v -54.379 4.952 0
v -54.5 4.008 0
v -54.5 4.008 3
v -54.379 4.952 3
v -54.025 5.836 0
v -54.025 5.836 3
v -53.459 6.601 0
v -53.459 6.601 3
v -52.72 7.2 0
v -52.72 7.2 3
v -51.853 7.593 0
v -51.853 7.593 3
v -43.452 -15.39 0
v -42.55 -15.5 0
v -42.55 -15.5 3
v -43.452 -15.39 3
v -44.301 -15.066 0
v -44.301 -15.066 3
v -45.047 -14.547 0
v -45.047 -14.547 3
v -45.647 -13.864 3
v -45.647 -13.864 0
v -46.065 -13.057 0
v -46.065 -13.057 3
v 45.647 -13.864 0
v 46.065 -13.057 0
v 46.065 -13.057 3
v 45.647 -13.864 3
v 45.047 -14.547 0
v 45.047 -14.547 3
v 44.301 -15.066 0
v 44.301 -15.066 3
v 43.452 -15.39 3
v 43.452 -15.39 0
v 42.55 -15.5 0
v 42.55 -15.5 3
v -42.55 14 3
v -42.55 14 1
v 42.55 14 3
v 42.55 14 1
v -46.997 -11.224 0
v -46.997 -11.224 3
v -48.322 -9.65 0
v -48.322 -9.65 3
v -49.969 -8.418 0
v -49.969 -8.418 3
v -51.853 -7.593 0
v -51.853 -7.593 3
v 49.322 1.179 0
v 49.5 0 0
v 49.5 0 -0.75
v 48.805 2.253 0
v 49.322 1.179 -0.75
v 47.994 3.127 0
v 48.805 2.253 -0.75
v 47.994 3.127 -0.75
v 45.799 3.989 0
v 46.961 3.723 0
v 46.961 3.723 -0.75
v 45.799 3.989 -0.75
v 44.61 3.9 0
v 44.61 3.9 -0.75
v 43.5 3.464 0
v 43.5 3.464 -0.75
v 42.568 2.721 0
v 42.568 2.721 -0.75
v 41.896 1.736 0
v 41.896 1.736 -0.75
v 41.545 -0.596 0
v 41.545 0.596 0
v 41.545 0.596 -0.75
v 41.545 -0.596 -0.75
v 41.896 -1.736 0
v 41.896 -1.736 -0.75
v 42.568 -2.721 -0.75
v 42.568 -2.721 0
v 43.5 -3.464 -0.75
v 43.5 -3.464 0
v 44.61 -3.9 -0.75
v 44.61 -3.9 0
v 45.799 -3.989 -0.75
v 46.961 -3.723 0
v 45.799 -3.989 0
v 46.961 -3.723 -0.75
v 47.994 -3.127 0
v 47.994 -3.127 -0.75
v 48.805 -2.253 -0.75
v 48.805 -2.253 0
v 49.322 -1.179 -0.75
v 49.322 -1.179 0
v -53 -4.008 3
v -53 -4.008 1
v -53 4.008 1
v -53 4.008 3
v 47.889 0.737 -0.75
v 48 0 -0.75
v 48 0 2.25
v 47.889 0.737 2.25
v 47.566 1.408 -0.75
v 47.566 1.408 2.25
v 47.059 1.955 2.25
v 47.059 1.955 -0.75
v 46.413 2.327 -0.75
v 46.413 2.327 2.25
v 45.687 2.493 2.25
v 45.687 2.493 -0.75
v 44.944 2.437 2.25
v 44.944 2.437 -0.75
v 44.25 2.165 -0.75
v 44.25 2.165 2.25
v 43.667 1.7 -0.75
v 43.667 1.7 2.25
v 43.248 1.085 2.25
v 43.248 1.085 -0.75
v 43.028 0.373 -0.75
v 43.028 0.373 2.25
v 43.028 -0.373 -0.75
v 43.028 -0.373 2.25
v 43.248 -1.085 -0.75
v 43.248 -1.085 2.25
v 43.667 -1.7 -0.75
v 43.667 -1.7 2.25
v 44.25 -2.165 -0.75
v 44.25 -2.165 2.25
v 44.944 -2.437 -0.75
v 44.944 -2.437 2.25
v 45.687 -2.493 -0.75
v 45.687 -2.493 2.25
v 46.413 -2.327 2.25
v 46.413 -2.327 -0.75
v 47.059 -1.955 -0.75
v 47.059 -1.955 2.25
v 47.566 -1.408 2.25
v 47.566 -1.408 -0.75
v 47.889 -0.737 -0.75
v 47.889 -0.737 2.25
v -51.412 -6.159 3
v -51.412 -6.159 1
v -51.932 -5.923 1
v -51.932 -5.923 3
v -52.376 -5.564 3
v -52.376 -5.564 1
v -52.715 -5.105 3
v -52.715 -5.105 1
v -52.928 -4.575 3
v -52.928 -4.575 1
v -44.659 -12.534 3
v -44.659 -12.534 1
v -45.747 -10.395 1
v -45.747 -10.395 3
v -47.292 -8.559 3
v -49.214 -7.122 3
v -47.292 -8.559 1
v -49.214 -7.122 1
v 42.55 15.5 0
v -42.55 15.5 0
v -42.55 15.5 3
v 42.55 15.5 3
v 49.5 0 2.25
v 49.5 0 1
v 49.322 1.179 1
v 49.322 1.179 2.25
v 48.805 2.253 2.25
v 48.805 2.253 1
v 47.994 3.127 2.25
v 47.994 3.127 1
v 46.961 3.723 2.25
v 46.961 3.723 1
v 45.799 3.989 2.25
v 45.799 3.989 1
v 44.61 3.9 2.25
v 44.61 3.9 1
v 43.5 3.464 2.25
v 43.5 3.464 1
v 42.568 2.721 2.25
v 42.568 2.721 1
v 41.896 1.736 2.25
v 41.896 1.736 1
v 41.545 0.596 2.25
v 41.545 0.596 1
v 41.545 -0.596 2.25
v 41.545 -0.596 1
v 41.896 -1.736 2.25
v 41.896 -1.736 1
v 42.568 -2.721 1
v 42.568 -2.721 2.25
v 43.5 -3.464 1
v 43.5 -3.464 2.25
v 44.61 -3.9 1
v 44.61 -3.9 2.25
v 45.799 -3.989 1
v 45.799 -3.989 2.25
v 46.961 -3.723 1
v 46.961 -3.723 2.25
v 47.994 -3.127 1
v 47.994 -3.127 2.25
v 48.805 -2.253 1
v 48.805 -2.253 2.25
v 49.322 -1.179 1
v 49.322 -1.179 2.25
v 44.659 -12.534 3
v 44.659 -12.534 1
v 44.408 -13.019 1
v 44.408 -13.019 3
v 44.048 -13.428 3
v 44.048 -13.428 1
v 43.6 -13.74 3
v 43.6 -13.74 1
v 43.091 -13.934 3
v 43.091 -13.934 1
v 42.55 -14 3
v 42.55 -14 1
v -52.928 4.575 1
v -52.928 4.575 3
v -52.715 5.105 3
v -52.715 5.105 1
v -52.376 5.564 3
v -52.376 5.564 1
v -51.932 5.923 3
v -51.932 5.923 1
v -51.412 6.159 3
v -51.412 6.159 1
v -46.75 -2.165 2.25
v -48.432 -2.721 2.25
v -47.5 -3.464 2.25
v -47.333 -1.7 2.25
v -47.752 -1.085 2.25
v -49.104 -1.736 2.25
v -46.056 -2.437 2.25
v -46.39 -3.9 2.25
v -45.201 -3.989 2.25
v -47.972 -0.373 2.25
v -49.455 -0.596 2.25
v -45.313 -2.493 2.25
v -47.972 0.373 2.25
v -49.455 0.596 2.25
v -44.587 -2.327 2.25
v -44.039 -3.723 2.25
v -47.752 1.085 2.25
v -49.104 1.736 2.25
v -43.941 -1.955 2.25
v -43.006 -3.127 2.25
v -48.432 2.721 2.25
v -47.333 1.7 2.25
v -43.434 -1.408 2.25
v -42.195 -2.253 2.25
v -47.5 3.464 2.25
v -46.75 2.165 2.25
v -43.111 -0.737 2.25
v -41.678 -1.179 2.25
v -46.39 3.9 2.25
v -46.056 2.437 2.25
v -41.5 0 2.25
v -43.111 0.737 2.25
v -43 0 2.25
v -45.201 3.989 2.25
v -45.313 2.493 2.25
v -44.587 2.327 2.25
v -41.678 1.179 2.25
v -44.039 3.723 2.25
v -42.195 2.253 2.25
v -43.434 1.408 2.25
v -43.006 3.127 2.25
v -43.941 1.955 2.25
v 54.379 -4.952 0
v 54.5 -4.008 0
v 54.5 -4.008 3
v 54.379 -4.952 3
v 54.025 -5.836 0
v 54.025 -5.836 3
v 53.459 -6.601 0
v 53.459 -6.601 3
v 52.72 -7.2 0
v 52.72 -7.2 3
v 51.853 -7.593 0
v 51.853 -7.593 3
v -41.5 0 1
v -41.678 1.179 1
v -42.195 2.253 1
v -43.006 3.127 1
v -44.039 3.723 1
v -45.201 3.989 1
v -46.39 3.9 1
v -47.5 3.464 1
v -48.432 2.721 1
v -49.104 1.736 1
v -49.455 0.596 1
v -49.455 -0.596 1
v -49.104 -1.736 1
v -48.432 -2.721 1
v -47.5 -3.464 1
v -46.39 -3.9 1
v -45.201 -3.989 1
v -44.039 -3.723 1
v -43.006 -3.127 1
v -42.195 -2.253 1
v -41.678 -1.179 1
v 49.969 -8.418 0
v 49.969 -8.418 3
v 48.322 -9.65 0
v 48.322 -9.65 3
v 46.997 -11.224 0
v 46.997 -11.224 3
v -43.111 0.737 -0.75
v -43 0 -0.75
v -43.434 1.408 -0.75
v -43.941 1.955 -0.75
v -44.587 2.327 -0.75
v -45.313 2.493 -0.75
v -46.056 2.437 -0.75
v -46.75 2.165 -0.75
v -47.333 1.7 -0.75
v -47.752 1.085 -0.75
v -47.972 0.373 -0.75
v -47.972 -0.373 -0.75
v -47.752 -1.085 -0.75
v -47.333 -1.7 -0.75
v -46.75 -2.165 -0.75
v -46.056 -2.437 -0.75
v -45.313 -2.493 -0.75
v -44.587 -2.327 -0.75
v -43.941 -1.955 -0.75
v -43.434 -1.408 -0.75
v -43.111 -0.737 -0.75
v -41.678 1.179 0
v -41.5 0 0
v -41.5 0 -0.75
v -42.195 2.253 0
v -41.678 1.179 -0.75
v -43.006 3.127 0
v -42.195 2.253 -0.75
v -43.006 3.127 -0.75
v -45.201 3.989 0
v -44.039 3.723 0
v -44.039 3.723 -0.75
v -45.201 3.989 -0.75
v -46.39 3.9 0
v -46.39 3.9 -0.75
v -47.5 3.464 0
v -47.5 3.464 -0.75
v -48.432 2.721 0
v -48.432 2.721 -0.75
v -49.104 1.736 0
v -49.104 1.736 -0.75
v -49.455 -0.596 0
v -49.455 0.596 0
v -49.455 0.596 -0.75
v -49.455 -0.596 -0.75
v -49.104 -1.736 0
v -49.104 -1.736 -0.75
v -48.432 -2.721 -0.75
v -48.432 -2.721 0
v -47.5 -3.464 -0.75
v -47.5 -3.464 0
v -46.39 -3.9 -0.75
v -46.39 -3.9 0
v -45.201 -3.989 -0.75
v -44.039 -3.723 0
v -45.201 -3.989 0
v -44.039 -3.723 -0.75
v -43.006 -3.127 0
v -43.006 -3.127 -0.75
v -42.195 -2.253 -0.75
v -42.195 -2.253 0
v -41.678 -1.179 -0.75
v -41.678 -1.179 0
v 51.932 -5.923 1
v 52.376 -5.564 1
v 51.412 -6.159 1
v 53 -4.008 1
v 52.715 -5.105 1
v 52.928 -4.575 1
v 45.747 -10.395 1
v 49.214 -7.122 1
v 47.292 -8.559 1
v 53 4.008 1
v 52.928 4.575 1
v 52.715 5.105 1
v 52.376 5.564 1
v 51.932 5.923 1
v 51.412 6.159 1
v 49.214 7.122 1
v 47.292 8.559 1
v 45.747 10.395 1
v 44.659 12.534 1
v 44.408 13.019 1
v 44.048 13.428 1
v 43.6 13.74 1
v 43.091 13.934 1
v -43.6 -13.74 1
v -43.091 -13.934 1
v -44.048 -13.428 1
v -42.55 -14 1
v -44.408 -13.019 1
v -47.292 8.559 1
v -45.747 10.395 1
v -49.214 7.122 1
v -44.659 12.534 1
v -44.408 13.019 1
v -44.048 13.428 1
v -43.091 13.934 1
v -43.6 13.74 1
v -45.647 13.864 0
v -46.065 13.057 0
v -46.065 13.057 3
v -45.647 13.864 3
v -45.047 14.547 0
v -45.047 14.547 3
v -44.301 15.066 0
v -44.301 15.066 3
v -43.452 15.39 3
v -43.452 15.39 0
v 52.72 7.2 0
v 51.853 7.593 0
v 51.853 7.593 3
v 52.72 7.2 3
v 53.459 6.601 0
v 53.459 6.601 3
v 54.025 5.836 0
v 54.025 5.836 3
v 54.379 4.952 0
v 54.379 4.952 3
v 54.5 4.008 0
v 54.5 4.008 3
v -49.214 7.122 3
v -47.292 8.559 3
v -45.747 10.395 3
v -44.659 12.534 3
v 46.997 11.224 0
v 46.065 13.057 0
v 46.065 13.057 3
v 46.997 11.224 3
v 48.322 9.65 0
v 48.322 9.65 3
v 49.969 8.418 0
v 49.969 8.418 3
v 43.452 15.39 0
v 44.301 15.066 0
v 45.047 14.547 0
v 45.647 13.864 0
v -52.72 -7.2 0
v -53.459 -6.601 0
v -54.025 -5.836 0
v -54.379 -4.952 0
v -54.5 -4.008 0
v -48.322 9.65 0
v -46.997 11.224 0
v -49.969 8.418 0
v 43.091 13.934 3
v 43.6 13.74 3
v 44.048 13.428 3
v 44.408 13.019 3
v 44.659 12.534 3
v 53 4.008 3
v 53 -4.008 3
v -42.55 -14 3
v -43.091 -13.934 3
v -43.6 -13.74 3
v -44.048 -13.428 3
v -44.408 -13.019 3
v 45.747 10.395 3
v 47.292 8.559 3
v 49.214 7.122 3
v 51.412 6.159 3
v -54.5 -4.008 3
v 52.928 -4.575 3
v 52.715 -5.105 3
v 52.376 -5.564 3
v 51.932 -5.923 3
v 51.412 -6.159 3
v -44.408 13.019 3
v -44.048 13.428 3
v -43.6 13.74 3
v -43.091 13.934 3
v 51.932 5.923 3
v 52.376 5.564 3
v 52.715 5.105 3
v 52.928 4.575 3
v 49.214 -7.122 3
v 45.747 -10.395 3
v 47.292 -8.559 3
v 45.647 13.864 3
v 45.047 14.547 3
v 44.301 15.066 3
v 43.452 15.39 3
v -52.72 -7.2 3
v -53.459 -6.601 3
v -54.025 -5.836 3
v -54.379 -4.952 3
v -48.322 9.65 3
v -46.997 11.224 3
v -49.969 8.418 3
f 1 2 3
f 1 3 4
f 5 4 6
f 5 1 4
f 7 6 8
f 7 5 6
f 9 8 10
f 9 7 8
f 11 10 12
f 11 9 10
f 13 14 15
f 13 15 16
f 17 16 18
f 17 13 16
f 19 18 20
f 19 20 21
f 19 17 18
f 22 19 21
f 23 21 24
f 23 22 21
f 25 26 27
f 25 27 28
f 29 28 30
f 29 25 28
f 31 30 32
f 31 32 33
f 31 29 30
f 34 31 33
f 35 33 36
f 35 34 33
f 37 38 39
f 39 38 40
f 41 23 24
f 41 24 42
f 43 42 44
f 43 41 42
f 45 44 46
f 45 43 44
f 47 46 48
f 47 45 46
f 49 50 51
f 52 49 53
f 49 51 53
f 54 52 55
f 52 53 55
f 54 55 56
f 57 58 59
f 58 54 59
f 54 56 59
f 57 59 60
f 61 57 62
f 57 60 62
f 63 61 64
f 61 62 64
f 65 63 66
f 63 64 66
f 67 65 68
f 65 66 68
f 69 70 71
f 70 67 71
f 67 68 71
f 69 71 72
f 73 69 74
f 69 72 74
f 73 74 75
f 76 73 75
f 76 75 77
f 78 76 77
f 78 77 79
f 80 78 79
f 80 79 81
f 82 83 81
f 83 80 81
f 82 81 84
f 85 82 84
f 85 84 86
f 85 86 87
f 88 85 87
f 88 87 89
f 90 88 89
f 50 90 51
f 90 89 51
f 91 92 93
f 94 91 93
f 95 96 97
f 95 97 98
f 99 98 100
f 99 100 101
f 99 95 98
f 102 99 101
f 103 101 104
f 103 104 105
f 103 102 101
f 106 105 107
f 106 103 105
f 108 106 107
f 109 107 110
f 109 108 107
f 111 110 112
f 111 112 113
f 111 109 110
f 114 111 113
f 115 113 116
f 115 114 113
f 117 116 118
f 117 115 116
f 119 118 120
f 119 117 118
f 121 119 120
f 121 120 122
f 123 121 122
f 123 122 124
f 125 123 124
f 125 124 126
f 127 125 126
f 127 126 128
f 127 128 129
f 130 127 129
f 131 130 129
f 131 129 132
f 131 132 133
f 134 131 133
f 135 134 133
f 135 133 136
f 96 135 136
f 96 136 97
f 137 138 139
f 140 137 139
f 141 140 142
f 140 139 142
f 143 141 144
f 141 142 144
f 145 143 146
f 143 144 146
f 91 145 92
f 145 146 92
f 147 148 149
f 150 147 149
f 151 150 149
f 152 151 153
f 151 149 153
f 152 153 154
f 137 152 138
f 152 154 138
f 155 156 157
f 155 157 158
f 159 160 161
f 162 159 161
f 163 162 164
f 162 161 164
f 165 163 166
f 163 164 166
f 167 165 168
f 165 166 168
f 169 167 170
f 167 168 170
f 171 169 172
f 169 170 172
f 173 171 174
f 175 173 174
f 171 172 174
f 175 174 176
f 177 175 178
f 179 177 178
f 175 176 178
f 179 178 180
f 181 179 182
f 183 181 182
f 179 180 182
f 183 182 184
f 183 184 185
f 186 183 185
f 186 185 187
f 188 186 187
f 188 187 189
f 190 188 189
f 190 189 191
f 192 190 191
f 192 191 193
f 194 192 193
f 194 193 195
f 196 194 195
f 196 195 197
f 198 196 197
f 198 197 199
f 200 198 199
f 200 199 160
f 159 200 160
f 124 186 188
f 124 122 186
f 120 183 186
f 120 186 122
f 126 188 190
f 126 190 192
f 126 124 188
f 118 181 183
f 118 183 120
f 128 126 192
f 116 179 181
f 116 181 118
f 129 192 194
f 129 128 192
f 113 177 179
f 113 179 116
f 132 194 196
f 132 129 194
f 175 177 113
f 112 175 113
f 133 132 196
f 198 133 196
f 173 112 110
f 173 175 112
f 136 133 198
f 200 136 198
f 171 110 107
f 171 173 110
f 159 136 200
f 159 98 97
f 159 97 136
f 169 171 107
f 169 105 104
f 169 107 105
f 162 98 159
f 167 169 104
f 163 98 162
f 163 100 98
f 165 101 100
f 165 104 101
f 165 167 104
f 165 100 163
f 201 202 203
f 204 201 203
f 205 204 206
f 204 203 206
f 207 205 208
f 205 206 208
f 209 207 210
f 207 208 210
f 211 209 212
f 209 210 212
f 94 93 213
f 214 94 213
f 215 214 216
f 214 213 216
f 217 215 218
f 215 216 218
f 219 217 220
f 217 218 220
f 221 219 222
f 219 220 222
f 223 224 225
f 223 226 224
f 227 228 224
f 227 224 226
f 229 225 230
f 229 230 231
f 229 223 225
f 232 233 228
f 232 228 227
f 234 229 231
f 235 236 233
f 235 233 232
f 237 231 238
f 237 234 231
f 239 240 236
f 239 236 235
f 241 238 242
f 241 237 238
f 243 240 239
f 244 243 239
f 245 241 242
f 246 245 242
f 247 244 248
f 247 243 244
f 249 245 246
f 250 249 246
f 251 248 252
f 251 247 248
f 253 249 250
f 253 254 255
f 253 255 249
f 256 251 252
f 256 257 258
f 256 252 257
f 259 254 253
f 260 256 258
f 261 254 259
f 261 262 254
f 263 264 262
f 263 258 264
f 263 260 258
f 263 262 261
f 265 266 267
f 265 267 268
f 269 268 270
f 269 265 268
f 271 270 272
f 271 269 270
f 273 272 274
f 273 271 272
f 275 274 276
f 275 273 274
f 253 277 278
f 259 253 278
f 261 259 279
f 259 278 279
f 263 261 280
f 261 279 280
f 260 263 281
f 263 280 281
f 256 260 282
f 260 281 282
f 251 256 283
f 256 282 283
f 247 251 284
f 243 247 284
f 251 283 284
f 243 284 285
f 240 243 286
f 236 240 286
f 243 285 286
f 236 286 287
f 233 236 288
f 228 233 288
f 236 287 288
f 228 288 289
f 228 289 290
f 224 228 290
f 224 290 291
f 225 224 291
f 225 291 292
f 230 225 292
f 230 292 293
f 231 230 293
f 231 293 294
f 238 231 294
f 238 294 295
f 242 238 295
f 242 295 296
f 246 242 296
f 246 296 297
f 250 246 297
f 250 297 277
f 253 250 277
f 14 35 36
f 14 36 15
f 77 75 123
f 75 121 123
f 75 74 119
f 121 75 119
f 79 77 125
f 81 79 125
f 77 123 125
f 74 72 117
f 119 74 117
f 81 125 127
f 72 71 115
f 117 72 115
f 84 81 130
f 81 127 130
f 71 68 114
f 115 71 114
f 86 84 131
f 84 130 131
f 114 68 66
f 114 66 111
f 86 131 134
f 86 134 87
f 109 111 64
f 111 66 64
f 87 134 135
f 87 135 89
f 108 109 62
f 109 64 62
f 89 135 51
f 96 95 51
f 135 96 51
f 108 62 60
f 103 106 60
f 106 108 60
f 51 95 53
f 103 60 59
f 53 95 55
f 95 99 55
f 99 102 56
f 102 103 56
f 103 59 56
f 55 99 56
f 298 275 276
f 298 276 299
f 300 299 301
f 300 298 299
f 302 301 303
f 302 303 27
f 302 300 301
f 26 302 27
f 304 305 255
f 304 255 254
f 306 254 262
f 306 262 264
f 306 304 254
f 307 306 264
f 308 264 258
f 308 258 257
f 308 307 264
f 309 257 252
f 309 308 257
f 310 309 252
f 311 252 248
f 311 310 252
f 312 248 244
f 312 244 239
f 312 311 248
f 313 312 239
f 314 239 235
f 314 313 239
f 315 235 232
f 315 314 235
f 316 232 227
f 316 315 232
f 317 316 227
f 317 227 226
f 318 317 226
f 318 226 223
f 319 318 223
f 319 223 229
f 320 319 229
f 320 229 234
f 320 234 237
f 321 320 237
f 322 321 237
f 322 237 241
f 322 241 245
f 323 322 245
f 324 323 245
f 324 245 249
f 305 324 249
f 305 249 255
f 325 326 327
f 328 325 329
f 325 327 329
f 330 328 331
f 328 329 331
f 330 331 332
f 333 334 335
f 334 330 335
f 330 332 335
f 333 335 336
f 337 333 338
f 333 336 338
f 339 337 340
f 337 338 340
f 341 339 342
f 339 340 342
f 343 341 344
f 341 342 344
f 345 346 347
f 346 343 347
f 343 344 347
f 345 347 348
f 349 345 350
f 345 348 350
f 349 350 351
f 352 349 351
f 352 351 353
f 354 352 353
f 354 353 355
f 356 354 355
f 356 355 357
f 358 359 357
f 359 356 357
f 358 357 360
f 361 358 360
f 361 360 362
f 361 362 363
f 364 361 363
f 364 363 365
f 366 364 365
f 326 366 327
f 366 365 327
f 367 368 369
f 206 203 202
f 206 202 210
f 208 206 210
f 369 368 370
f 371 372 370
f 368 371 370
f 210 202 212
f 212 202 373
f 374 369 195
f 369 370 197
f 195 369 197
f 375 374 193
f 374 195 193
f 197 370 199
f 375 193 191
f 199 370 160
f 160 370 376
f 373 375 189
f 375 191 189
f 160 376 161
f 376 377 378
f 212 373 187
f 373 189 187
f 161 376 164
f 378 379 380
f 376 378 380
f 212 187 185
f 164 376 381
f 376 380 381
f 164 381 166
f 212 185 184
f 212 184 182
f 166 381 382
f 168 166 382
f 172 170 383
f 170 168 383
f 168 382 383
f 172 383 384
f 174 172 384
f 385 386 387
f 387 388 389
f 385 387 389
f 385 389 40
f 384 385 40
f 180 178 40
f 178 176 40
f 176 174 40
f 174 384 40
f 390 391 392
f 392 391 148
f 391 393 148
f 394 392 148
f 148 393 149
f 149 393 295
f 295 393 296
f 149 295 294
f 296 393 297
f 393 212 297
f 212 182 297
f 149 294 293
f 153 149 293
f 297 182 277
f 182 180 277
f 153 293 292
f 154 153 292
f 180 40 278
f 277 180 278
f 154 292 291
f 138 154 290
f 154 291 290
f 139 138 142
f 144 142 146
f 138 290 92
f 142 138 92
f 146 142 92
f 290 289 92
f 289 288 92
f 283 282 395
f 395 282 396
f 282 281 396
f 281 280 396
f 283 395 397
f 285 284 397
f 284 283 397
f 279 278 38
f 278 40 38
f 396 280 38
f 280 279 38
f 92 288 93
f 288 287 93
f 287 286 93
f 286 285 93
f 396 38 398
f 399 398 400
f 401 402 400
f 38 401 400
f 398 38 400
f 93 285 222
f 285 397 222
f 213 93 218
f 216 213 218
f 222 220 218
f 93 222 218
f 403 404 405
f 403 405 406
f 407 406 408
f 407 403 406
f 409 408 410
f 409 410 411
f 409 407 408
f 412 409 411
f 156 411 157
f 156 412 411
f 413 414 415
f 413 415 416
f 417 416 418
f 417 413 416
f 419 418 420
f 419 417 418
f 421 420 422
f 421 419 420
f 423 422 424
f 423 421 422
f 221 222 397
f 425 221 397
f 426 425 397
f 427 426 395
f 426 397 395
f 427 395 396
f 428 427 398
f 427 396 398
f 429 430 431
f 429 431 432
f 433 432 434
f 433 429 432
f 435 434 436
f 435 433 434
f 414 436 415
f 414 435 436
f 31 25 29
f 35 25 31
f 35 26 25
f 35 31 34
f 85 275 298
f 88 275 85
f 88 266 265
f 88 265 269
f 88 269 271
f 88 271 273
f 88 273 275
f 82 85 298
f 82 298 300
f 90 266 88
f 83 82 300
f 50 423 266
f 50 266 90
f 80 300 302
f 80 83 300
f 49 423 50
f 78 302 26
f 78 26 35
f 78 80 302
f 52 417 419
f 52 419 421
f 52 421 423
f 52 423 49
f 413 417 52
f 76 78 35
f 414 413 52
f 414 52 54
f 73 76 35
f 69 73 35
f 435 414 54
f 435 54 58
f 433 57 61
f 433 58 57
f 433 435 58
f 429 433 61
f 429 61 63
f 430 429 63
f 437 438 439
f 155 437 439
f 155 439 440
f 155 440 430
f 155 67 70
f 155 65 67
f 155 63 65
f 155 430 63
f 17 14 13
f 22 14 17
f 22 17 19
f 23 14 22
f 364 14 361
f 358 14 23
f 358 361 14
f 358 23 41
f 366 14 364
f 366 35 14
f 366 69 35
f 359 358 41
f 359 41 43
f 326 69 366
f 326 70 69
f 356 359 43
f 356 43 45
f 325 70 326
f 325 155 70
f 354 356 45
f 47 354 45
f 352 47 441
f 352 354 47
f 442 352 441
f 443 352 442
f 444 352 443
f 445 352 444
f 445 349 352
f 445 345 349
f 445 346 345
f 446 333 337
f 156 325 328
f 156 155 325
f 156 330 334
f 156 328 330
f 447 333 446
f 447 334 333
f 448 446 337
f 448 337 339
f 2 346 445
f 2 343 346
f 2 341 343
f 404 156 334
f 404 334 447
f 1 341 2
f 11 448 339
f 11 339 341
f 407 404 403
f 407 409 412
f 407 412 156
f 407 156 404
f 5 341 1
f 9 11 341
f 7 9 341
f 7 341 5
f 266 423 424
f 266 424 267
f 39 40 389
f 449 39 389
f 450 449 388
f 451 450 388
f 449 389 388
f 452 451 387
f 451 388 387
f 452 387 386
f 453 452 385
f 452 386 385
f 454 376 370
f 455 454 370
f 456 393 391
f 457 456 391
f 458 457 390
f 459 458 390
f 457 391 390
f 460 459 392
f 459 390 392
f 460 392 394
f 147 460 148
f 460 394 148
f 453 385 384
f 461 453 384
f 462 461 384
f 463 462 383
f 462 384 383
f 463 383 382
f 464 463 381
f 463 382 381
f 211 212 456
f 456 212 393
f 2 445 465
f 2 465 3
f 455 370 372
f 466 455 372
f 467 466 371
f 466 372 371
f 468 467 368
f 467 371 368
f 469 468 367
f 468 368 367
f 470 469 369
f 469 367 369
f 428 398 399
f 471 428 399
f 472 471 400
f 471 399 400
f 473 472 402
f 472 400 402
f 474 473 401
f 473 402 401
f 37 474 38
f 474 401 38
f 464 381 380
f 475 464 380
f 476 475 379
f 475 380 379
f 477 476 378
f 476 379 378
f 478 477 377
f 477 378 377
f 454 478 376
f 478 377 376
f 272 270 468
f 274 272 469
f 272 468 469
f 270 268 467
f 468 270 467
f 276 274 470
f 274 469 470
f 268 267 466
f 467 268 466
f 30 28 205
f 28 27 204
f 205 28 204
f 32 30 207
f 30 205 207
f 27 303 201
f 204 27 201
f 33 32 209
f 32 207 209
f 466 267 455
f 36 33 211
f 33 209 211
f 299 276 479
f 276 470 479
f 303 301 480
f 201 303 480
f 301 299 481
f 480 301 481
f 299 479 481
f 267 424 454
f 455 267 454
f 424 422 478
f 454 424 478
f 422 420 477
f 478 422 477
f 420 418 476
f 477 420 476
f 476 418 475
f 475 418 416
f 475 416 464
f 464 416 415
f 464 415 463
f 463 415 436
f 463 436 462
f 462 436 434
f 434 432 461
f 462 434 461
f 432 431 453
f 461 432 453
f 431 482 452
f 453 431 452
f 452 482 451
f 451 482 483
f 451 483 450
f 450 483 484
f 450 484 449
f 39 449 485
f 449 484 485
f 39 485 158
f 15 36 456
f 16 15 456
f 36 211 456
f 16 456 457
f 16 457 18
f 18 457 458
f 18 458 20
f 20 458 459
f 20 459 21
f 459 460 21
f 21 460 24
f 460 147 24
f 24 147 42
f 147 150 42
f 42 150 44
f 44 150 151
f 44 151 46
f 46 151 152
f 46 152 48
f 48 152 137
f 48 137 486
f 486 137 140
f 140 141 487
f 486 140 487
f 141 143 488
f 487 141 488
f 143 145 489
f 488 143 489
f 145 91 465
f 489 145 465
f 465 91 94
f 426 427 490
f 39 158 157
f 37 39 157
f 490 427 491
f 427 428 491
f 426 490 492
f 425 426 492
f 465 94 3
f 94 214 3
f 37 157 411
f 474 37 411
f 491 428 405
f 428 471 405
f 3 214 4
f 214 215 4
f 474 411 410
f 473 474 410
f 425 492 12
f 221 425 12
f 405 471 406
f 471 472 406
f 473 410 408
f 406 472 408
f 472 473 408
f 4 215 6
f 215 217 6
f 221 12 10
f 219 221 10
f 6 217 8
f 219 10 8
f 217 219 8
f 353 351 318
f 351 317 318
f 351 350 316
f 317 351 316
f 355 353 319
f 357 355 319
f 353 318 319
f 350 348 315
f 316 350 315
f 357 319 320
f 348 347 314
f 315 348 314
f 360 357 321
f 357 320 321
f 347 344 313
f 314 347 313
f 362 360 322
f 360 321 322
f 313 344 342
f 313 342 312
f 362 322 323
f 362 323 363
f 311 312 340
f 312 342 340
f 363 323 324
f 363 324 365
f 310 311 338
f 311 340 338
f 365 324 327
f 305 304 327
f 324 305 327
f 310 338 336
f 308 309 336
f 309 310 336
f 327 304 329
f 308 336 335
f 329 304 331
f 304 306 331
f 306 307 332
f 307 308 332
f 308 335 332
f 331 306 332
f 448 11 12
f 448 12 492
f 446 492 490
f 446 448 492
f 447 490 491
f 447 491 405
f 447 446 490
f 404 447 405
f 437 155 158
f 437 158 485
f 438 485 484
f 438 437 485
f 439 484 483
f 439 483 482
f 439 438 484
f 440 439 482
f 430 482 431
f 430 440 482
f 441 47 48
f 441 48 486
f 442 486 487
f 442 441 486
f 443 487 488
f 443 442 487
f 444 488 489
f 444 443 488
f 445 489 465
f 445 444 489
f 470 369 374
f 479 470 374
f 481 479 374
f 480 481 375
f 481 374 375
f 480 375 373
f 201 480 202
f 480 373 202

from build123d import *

# Parameters (mm, degrees)
NAME_PLATE_BEZEL_DEPTH     = 3
NAME_PLATE_BACKPLATE_DEPTH = 1
HOLE_BEZEL_DEPTH           = 2.25
HOLE_BEZEL_DEPTH_BACK      = 0.75
HOLE_SKETCH_R              = 4
HOLE_SKETCH_R_2            = 2.5
HOLE_CUTOUT_DEPTH          = 57.740637994
HOLE_CUTOUT_DEPTH_BACK     = 57.740637994
HOLE_SKETCH_6_R            = 2.5


with BuildPart() as part:
    # Base Plate Sketch → Name Plate Bezel (new body)
    with BuildSketch(Plane.XY):
        with BuildLine():
            Line((-42.549751124, 15.5), (42.549751124, 15.5))
            ThreePointArc((42.549751124, 15.5), (44.689893576, 14.829332766), (46.064530205, 13.057221485))
            ThreePointArc((46.064530205, 13.057221485), (48.321727581, 9.650169967), (51.852941176, 7.592630032))
            ThreePointArc((51.852941176, 7.592630032), (53.76649875, 6.236327413), (54.5, 4.008495442))
            Line((54.5, 4.008495442), (54.5, -4.008495442))
            ThreePointArc((54.5, -4.008495442), (53.76649875, -6.236327413), (51.852941176, -7.592630032))
            ThreePointArc((51.852941176, -7.592630032), (48.321727581, -9.650169967), (46.064530205, -13.057221485))
            ThreePointArc((46.064530205, -13.057221485), (44.689893576, -14.829332766), (42.549751124, -15.5))
            Line((42.549751124, -15.5), (-42.549751124, -15.5))
            ThreePointArc((-42.549751124, -15.5), (-44.689893576, -14.829332766), (-46.064530205, -13.057221485))
            ThreePointArc((-46.064530205, -13.057221485), (-48.321727581, -9.650169967), (-51.852941176, -7.592630032))
            ThreePointArc((-51.852941176, -7.592630032), (-53.76649875, -6.236327413), (-54.5, -4.008495442))
            Line((-54.5, -4.008495442), (-54.5, 4.008495442))
            ThreePointArc((-54.5, 4.008495442), (-53.76649875, 6.236327413), (-51.852941176, 7.592630032))
            ThreePointArc((-51.852941176, 7.592630032), (-48.321727581, 9.650169967), (-46.064530205, 13.057221485))
            ThreePointArc((-46.064530205, 13.057221485), (-44.689893576, 14.829332766), (-42.549751124, 15.5))
        make_face()
        with BuildLine():
            Line((-42.549751124, 14), (42.549751124, 14))
            ThreePointArc((42.549751124, 14), (43.833836595, 13.59759966), (44.658618573, 12.534332891))
            ThreePointArc((44.658618573, 12.534332891), (47.292015511, 8.559439453), (51.411764706, 6.158976196))
            ThreePointArc((51.411764706, 6.158976196), (52.55989925, 5.345194625), (53, 4.008495442))
            Line((53, 4.008495442), (53, -4.008495442))
            ThreePointArc((53, -4.008495442), (52.55989925, -5.345194625), (51.411764706, -6.158976196))
            ThreePointArc((51.411764706, -6.158976196), (47.292015511, -8.559439453), (44.658618573, -12.534332891))
            ThreePointArc((44.658618573, -12.534332891), (43.833836595, -13.59759966), (42.549751124, -14))
            Line((42.549751124, -14), (-42.549751124, -14))
            ThreePointArc((-42.549751124, -14), (-43.833836595, -13.59759966), (-44.658618573, -12.534332891))
            ThreePointArc((-44.658618573, -12.534332891), (-47.292015511, -8.559439453), (-51.411764706, -6.158976196))
            ThreePointArc((-51.411764706, -6.158976196), (-52.55989925, -5.345194625), (-53, -4.008495442))
            Line((-53, -4.008495442), (-53, 4.008495442))
            ThreePointArc((-53, 4.008495442), (-52.55989925, 5.345194625), (-51.411764706, 6.158976196))
            ThreePointArc((-51.411764706, 6.158976196), (-47.292015511, 8.559439453), (-44.658618573, 12.534332891))
            ThreePointArc((-44.658618573, 12.534332891), (-43.833836595, 13.59759966), (-42.549751124, 14))
        make_face(mode=Mode.SUBTRACT)
    extrude(amount=NAME_PLATE_BEZEL_DEPTH)

    # Sketch1<6> → Name Plate Backplate (add)
    with BuildSketch(Plane.XY):
        with BuildLine():
            Line((-42.549751124, 15.5), (42.549751124, 15.5))
            ThreePointArc((42.549751124, 15.5), (44.689893576, 14.829332766), (46.064530205, 13.057221485))
            ThreePointArc((46.064530205, 13.057221485), (48.321727581, 9.650169967), (51.852941176, 7.592630032))
            ThreePointArc((51.852941176, 7.592630032), (53.76649875, 6.236327413), (54.5, 4.008495442))
            Line((54.5, 4.008495442), (54.5, -4.008495442))
            ThreePointArc((54.5, -4.008495442), (53.76649875, -6.236327413), (51.852941176, -7.592630032))
            ThreePointArc((51.852941176, -7.592630032), (48.321727581, -9.650169967), (46.064530205, -13.057221485))
            ThreePointArc((46.064530205, -13.057221485), (44.689893576, -14.829332766), (42.549751124, -15.5))
            Line((42.549751124, -15.5), (-42.549751124, -15.5))
            ThreePointArc((-42.549751124, -15.5), (-44.689893576, -14.829332766), (-46.064530205, -13.057221485))
            ThreePointArc((-46.064530205, -13.057221485), (-48.321727581, -9.650169967), (-51.852941176, -7.592630032))
            ThreePointArc((-51.852941176, -7.592630032), (-53.76649875, -6.236327413), (-54.5, -4.008495442))
            Line((-54.5, -4.008495442), (-54.5, 4.008495442))
            ThreePointArc((-54.5, 4.008495442), (-53.76649875, 6.236327413), (-51.852941176, 7.592630032))
            ThreePointArc((-51.852941176, 7.592630032), (-48.321727581, 9.650169967), (-46.064530205, 13.057221485))
            ThreePointArc((-46.064530205, 13.057221485), (-44.689893576, 14.829332766), (-42.549751124, 15.5))
        make_face()
    extrude(amount=NAME_PLATE_BACKPLATE_DEPTH)

    # Hole Sketch → Hole Bezel (add, two sides: drawn at the far end of the back side and taken through both)
    # profile 1 of 2: a face of its own
    with BuildSketch(Plane.XY.offset(-HOLE_BEZEL_DEPTH_BACK)):
        with Locations((45.5, 0)):
            Circle(HOLE_SKETCH_R)
        with Locations((45.5, 0)):
            Circle(HOLE_SKETCH_R_2, mode=Mode.SUBTRACT)
    # profile 2 of 2: a face of its own
    with BuildSketch(Plane.XY.offset(-HOLE_BEZEL_DEPTH_BACK)):
        with Locations((-45.5, 0)):
            Circle(HOLE_SKETCH_R)
        with Locations((-45.5, 0)):
            Circle(HOLE_SKETCH_R_2, mode=Mode.SUBTRACT)
    extrude(amount=HOLE_BEZEL_DEPTH + HOLE_BEZEL_DEPTH_BACK)

    # Hole Sketch<6> → Hole Cutout (cut, two sides: drawn at the far end of the back side and taken through both)
    with BuildSketch(Plane.XY.offset(-HOLE_CUTOUT_DEPTH_BACK)):
        with Locations((-45.5, 0)):
            Circle(HOLE_SKETCH_6_R)
        with Locations((45.5, 0)):
            Circle(HOLE_SKETCH_6_R)
    extrude(amount=HOLE_CUTOUT_DEPTH + HOLE_CUTOUT_DEPTH_BACK, mode=Mode.SUBTRACT)


solid = part.part
